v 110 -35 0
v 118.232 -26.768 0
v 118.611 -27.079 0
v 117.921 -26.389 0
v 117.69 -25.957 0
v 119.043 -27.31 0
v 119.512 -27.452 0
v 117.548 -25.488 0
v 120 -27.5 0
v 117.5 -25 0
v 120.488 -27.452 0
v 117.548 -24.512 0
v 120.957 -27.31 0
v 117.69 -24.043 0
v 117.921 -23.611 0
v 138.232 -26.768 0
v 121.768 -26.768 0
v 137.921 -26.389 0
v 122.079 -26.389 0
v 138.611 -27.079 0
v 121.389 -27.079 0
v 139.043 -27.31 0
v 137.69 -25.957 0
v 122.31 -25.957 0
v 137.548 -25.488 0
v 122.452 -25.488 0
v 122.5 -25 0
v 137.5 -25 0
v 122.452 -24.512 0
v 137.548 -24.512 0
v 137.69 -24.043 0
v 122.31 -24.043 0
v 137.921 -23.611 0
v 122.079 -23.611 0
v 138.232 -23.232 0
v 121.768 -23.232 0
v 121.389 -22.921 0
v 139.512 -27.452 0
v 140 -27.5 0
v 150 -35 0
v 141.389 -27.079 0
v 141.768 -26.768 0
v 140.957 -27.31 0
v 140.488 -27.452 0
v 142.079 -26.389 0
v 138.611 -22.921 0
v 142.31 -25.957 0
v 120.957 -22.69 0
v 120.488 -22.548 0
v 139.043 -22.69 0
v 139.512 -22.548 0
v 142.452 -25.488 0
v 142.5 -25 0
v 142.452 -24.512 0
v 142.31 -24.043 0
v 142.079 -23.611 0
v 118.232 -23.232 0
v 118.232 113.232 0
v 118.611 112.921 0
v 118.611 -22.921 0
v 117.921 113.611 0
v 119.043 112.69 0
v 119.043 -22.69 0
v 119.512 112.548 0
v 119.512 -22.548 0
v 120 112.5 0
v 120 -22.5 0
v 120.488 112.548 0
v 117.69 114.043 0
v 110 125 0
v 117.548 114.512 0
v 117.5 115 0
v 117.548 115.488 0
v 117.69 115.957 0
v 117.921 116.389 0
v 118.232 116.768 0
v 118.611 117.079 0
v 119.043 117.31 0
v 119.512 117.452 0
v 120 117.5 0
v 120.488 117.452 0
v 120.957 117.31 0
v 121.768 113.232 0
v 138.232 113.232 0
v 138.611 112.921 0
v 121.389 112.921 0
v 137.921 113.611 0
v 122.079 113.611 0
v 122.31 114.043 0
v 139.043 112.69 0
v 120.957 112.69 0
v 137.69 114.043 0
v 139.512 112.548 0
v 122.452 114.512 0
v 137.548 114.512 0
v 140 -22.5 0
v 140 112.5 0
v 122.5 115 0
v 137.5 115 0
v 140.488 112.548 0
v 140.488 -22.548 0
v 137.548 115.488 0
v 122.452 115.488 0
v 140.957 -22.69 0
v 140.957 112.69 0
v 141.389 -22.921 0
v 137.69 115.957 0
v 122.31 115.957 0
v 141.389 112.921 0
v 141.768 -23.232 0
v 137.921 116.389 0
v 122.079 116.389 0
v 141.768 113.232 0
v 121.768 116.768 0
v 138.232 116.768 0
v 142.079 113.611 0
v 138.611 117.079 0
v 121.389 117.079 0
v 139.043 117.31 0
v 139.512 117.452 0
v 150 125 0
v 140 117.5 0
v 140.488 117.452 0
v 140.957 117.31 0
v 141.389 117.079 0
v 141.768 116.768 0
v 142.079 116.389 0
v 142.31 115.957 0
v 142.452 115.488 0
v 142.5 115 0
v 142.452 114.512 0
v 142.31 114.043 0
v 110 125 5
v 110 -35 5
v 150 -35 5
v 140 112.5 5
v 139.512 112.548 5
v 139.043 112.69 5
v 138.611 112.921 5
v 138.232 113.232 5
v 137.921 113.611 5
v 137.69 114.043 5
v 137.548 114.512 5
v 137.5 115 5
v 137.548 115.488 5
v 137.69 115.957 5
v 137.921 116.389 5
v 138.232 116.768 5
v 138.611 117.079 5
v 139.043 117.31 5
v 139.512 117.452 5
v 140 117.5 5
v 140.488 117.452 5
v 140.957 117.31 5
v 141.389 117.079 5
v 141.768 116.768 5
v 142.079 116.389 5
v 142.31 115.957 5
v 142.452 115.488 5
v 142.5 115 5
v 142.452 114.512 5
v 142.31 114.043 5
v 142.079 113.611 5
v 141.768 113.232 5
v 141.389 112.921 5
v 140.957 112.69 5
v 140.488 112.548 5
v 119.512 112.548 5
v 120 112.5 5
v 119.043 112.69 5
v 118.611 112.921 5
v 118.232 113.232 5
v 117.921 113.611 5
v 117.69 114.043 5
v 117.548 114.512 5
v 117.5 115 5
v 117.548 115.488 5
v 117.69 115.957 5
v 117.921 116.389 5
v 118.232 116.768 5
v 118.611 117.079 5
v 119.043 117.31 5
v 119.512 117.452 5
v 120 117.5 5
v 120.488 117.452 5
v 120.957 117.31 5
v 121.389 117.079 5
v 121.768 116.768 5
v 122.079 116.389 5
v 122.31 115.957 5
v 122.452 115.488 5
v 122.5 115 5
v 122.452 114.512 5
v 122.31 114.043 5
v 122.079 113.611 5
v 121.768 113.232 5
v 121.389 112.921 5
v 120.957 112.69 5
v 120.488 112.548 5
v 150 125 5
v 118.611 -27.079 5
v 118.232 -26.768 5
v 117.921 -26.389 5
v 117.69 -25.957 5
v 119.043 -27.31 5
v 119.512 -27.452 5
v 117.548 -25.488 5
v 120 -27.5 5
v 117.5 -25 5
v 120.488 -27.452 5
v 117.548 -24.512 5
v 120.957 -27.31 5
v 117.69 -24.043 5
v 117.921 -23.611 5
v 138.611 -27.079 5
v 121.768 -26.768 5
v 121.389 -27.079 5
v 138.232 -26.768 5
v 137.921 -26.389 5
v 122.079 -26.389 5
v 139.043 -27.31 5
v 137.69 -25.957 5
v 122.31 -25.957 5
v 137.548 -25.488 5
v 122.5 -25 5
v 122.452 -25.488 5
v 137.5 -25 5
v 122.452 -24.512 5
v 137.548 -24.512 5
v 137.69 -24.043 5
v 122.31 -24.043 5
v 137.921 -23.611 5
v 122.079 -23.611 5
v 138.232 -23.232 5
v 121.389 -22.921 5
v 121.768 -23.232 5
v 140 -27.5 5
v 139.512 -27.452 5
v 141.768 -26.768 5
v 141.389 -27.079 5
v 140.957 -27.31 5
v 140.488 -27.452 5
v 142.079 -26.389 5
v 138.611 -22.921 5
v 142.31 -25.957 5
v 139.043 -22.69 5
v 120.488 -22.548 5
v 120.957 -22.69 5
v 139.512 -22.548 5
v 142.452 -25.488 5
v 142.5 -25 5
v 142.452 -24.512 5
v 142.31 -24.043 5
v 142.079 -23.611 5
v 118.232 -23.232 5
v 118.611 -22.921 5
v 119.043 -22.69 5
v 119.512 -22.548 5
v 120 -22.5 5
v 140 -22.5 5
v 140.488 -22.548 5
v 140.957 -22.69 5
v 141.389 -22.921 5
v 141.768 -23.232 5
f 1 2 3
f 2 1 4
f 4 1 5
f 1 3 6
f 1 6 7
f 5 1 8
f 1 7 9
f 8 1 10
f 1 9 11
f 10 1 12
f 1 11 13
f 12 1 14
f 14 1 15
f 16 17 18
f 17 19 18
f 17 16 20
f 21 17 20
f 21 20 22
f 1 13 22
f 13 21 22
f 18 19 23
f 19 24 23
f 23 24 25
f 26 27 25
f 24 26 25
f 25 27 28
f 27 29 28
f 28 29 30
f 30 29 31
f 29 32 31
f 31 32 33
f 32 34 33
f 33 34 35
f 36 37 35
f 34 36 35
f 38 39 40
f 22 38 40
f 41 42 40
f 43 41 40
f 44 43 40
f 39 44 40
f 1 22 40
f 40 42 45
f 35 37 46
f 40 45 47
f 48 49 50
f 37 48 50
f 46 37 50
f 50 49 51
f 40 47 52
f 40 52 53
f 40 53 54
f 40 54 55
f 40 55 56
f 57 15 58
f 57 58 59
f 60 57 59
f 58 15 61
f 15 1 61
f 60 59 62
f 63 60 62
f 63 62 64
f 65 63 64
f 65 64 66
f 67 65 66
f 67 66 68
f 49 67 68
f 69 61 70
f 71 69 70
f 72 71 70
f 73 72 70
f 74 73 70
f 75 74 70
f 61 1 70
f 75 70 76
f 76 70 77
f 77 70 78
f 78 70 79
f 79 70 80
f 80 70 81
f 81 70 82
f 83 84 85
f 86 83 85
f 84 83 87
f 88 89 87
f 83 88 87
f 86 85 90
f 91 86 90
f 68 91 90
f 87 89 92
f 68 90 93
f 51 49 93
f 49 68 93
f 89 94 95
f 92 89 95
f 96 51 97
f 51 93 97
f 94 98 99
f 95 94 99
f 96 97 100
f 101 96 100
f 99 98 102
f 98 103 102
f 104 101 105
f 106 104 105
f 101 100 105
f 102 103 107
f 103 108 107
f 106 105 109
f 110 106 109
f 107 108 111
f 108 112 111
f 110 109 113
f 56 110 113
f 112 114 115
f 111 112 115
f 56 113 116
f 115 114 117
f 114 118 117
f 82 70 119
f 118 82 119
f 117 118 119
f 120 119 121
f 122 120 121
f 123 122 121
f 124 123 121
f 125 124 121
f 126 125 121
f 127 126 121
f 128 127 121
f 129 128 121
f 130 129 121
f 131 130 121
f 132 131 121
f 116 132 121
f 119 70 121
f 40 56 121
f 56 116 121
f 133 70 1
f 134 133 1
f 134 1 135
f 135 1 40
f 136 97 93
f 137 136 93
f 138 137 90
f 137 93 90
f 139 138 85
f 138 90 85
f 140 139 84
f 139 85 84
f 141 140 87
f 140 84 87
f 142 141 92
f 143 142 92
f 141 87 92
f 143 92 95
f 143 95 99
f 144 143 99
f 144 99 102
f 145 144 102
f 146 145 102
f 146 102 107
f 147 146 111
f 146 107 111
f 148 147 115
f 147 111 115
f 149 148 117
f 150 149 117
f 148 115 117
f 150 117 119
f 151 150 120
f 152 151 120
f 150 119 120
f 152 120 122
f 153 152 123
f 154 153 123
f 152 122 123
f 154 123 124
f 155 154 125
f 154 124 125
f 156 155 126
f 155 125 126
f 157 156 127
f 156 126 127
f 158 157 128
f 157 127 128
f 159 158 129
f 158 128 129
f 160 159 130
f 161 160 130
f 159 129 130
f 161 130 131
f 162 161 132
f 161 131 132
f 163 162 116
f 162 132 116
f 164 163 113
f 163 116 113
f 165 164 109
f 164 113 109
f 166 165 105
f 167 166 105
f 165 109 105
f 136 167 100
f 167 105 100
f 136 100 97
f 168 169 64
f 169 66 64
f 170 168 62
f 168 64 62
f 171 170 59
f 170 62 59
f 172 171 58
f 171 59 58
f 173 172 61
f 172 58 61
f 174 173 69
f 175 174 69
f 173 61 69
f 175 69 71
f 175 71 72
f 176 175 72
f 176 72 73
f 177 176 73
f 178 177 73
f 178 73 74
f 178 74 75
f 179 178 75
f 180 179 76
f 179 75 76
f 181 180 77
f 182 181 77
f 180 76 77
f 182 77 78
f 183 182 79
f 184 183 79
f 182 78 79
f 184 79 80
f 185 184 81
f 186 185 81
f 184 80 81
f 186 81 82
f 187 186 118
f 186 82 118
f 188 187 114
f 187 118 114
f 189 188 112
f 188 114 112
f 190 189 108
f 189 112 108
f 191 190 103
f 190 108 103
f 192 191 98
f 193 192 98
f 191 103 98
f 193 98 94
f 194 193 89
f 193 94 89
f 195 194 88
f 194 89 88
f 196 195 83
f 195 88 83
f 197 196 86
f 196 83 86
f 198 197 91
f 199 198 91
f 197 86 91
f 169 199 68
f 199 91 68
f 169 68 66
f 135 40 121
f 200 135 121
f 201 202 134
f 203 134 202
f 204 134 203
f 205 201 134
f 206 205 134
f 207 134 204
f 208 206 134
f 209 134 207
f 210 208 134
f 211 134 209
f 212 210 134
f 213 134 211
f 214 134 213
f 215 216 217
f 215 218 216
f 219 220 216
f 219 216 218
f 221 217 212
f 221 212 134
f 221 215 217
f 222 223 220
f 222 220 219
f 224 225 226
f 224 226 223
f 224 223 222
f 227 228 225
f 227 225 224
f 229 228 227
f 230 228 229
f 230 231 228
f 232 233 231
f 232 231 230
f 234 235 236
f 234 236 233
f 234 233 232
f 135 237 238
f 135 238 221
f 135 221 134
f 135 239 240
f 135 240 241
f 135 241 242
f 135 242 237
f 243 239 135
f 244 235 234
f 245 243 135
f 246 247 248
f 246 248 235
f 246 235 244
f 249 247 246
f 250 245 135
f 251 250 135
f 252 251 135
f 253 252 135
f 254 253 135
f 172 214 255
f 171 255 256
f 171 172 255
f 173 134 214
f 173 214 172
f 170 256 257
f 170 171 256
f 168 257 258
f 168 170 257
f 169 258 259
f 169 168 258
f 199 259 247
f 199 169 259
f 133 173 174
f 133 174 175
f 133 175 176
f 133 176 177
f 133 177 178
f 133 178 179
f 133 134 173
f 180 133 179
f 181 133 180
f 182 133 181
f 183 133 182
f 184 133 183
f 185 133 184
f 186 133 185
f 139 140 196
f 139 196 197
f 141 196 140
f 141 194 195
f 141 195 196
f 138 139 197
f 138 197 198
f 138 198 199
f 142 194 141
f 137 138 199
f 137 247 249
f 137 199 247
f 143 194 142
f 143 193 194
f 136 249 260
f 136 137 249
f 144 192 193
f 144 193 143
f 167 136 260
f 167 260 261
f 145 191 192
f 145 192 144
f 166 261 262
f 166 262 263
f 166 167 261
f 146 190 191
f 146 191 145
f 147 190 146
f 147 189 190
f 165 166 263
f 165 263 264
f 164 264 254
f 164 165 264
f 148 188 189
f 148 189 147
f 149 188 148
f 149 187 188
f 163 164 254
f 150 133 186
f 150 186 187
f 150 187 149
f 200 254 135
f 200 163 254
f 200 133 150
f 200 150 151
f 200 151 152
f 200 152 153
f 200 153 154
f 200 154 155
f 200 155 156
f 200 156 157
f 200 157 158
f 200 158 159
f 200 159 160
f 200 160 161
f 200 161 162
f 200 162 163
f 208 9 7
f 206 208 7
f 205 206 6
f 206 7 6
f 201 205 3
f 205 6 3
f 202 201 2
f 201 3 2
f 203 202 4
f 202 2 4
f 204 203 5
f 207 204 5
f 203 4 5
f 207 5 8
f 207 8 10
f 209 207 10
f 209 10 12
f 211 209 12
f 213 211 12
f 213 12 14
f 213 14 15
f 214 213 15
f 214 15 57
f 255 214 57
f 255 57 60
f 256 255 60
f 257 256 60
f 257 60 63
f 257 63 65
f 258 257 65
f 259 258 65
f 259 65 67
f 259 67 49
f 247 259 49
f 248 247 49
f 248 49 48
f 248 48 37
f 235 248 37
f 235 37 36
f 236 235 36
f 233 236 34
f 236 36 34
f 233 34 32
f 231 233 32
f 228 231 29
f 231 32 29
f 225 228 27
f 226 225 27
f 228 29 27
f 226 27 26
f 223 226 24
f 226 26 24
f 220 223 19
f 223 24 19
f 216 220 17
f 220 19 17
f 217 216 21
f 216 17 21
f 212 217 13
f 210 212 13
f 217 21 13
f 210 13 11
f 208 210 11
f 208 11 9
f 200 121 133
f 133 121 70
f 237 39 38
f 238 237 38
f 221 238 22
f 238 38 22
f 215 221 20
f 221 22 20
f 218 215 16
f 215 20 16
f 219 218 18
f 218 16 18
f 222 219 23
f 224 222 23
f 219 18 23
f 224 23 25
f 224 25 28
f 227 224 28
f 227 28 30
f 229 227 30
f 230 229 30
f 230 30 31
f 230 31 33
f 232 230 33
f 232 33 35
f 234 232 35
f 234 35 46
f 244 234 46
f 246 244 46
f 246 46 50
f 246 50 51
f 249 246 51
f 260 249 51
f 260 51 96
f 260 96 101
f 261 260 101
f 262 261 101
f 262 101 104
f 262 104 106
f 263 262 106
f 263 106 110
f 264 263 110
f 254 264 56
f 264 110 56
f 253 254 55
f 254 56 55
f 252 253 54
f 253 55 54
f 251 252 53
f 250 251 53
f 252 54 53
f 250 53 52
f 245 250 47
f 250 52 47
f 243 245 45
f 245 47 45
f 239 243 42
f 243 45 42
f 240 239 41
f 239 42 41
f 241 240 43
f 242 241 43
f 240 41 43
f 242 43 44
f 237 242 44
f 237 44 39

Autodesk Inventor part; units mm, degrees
ref_plane "YZ Plane" through (0, 0, 0) normal (1, 0, 0) x (0, 1, 0)
ref_plane "XZ Plane" through (0, 0, 0) normal (0, 1, 0) x (-1, 0, 0)
ref_plane "XY Plane" through (0, 0, 0) normal (0, 0, 1) x (1, 0, 0)
sketch "Sketch1" plane through (0, 0, 0) normal (0, 0, 1) x (1, 0, 0)
  line L0 (150, 125) -> (110, 125)
  line L1 (110, 125) -> (110, -35)
  line L2 (110, -35) -> (150, -35)
  line L3 (150, -35) -> (150, 125)
  point P0 (0, 0)
  dimension "d0" = 40
  dimension "d3" = 160
extrude "Extrusion1" add sketch "Sketch1" along normal blind 5
ref_plane "Work Plane1" through (0, 0, 0) normal (0, 0, 1) x (1, 0, 0)
sketch "Sketch3" plane through (0, 0, 5) normal (0, 0, 1) x (1, 0, 0)
  line L0 (150, 125) -> (110, 125) construction
  line L1 (130, 125) -> (130, -35) construction
  line L2 (110, -35) -> (150, -35) construction
  line L3 (110, 125) -> (110, -35) construction
  line L4 (110, 45) -> (150, 45) construction
  line L5 (150, -35) -> (150, 125) construction
  point P0 (0, 0)
  point P1 (120, 115)
  point P2 (140, 115)
  point P3 (120, -25)
  point P4 (140, -25)
  dimension "d4" = 20
  dimension "d5" = 10
hole "Hole1" at (120, 115, 5) at (140, 115, 5) at (120, -25, 5) at (140, -25, 5) direction (0, 0, -1) diameter 5 end through all
properties part number "ReposadorPinzas" material "MDF Medium Density Fiberboard"
